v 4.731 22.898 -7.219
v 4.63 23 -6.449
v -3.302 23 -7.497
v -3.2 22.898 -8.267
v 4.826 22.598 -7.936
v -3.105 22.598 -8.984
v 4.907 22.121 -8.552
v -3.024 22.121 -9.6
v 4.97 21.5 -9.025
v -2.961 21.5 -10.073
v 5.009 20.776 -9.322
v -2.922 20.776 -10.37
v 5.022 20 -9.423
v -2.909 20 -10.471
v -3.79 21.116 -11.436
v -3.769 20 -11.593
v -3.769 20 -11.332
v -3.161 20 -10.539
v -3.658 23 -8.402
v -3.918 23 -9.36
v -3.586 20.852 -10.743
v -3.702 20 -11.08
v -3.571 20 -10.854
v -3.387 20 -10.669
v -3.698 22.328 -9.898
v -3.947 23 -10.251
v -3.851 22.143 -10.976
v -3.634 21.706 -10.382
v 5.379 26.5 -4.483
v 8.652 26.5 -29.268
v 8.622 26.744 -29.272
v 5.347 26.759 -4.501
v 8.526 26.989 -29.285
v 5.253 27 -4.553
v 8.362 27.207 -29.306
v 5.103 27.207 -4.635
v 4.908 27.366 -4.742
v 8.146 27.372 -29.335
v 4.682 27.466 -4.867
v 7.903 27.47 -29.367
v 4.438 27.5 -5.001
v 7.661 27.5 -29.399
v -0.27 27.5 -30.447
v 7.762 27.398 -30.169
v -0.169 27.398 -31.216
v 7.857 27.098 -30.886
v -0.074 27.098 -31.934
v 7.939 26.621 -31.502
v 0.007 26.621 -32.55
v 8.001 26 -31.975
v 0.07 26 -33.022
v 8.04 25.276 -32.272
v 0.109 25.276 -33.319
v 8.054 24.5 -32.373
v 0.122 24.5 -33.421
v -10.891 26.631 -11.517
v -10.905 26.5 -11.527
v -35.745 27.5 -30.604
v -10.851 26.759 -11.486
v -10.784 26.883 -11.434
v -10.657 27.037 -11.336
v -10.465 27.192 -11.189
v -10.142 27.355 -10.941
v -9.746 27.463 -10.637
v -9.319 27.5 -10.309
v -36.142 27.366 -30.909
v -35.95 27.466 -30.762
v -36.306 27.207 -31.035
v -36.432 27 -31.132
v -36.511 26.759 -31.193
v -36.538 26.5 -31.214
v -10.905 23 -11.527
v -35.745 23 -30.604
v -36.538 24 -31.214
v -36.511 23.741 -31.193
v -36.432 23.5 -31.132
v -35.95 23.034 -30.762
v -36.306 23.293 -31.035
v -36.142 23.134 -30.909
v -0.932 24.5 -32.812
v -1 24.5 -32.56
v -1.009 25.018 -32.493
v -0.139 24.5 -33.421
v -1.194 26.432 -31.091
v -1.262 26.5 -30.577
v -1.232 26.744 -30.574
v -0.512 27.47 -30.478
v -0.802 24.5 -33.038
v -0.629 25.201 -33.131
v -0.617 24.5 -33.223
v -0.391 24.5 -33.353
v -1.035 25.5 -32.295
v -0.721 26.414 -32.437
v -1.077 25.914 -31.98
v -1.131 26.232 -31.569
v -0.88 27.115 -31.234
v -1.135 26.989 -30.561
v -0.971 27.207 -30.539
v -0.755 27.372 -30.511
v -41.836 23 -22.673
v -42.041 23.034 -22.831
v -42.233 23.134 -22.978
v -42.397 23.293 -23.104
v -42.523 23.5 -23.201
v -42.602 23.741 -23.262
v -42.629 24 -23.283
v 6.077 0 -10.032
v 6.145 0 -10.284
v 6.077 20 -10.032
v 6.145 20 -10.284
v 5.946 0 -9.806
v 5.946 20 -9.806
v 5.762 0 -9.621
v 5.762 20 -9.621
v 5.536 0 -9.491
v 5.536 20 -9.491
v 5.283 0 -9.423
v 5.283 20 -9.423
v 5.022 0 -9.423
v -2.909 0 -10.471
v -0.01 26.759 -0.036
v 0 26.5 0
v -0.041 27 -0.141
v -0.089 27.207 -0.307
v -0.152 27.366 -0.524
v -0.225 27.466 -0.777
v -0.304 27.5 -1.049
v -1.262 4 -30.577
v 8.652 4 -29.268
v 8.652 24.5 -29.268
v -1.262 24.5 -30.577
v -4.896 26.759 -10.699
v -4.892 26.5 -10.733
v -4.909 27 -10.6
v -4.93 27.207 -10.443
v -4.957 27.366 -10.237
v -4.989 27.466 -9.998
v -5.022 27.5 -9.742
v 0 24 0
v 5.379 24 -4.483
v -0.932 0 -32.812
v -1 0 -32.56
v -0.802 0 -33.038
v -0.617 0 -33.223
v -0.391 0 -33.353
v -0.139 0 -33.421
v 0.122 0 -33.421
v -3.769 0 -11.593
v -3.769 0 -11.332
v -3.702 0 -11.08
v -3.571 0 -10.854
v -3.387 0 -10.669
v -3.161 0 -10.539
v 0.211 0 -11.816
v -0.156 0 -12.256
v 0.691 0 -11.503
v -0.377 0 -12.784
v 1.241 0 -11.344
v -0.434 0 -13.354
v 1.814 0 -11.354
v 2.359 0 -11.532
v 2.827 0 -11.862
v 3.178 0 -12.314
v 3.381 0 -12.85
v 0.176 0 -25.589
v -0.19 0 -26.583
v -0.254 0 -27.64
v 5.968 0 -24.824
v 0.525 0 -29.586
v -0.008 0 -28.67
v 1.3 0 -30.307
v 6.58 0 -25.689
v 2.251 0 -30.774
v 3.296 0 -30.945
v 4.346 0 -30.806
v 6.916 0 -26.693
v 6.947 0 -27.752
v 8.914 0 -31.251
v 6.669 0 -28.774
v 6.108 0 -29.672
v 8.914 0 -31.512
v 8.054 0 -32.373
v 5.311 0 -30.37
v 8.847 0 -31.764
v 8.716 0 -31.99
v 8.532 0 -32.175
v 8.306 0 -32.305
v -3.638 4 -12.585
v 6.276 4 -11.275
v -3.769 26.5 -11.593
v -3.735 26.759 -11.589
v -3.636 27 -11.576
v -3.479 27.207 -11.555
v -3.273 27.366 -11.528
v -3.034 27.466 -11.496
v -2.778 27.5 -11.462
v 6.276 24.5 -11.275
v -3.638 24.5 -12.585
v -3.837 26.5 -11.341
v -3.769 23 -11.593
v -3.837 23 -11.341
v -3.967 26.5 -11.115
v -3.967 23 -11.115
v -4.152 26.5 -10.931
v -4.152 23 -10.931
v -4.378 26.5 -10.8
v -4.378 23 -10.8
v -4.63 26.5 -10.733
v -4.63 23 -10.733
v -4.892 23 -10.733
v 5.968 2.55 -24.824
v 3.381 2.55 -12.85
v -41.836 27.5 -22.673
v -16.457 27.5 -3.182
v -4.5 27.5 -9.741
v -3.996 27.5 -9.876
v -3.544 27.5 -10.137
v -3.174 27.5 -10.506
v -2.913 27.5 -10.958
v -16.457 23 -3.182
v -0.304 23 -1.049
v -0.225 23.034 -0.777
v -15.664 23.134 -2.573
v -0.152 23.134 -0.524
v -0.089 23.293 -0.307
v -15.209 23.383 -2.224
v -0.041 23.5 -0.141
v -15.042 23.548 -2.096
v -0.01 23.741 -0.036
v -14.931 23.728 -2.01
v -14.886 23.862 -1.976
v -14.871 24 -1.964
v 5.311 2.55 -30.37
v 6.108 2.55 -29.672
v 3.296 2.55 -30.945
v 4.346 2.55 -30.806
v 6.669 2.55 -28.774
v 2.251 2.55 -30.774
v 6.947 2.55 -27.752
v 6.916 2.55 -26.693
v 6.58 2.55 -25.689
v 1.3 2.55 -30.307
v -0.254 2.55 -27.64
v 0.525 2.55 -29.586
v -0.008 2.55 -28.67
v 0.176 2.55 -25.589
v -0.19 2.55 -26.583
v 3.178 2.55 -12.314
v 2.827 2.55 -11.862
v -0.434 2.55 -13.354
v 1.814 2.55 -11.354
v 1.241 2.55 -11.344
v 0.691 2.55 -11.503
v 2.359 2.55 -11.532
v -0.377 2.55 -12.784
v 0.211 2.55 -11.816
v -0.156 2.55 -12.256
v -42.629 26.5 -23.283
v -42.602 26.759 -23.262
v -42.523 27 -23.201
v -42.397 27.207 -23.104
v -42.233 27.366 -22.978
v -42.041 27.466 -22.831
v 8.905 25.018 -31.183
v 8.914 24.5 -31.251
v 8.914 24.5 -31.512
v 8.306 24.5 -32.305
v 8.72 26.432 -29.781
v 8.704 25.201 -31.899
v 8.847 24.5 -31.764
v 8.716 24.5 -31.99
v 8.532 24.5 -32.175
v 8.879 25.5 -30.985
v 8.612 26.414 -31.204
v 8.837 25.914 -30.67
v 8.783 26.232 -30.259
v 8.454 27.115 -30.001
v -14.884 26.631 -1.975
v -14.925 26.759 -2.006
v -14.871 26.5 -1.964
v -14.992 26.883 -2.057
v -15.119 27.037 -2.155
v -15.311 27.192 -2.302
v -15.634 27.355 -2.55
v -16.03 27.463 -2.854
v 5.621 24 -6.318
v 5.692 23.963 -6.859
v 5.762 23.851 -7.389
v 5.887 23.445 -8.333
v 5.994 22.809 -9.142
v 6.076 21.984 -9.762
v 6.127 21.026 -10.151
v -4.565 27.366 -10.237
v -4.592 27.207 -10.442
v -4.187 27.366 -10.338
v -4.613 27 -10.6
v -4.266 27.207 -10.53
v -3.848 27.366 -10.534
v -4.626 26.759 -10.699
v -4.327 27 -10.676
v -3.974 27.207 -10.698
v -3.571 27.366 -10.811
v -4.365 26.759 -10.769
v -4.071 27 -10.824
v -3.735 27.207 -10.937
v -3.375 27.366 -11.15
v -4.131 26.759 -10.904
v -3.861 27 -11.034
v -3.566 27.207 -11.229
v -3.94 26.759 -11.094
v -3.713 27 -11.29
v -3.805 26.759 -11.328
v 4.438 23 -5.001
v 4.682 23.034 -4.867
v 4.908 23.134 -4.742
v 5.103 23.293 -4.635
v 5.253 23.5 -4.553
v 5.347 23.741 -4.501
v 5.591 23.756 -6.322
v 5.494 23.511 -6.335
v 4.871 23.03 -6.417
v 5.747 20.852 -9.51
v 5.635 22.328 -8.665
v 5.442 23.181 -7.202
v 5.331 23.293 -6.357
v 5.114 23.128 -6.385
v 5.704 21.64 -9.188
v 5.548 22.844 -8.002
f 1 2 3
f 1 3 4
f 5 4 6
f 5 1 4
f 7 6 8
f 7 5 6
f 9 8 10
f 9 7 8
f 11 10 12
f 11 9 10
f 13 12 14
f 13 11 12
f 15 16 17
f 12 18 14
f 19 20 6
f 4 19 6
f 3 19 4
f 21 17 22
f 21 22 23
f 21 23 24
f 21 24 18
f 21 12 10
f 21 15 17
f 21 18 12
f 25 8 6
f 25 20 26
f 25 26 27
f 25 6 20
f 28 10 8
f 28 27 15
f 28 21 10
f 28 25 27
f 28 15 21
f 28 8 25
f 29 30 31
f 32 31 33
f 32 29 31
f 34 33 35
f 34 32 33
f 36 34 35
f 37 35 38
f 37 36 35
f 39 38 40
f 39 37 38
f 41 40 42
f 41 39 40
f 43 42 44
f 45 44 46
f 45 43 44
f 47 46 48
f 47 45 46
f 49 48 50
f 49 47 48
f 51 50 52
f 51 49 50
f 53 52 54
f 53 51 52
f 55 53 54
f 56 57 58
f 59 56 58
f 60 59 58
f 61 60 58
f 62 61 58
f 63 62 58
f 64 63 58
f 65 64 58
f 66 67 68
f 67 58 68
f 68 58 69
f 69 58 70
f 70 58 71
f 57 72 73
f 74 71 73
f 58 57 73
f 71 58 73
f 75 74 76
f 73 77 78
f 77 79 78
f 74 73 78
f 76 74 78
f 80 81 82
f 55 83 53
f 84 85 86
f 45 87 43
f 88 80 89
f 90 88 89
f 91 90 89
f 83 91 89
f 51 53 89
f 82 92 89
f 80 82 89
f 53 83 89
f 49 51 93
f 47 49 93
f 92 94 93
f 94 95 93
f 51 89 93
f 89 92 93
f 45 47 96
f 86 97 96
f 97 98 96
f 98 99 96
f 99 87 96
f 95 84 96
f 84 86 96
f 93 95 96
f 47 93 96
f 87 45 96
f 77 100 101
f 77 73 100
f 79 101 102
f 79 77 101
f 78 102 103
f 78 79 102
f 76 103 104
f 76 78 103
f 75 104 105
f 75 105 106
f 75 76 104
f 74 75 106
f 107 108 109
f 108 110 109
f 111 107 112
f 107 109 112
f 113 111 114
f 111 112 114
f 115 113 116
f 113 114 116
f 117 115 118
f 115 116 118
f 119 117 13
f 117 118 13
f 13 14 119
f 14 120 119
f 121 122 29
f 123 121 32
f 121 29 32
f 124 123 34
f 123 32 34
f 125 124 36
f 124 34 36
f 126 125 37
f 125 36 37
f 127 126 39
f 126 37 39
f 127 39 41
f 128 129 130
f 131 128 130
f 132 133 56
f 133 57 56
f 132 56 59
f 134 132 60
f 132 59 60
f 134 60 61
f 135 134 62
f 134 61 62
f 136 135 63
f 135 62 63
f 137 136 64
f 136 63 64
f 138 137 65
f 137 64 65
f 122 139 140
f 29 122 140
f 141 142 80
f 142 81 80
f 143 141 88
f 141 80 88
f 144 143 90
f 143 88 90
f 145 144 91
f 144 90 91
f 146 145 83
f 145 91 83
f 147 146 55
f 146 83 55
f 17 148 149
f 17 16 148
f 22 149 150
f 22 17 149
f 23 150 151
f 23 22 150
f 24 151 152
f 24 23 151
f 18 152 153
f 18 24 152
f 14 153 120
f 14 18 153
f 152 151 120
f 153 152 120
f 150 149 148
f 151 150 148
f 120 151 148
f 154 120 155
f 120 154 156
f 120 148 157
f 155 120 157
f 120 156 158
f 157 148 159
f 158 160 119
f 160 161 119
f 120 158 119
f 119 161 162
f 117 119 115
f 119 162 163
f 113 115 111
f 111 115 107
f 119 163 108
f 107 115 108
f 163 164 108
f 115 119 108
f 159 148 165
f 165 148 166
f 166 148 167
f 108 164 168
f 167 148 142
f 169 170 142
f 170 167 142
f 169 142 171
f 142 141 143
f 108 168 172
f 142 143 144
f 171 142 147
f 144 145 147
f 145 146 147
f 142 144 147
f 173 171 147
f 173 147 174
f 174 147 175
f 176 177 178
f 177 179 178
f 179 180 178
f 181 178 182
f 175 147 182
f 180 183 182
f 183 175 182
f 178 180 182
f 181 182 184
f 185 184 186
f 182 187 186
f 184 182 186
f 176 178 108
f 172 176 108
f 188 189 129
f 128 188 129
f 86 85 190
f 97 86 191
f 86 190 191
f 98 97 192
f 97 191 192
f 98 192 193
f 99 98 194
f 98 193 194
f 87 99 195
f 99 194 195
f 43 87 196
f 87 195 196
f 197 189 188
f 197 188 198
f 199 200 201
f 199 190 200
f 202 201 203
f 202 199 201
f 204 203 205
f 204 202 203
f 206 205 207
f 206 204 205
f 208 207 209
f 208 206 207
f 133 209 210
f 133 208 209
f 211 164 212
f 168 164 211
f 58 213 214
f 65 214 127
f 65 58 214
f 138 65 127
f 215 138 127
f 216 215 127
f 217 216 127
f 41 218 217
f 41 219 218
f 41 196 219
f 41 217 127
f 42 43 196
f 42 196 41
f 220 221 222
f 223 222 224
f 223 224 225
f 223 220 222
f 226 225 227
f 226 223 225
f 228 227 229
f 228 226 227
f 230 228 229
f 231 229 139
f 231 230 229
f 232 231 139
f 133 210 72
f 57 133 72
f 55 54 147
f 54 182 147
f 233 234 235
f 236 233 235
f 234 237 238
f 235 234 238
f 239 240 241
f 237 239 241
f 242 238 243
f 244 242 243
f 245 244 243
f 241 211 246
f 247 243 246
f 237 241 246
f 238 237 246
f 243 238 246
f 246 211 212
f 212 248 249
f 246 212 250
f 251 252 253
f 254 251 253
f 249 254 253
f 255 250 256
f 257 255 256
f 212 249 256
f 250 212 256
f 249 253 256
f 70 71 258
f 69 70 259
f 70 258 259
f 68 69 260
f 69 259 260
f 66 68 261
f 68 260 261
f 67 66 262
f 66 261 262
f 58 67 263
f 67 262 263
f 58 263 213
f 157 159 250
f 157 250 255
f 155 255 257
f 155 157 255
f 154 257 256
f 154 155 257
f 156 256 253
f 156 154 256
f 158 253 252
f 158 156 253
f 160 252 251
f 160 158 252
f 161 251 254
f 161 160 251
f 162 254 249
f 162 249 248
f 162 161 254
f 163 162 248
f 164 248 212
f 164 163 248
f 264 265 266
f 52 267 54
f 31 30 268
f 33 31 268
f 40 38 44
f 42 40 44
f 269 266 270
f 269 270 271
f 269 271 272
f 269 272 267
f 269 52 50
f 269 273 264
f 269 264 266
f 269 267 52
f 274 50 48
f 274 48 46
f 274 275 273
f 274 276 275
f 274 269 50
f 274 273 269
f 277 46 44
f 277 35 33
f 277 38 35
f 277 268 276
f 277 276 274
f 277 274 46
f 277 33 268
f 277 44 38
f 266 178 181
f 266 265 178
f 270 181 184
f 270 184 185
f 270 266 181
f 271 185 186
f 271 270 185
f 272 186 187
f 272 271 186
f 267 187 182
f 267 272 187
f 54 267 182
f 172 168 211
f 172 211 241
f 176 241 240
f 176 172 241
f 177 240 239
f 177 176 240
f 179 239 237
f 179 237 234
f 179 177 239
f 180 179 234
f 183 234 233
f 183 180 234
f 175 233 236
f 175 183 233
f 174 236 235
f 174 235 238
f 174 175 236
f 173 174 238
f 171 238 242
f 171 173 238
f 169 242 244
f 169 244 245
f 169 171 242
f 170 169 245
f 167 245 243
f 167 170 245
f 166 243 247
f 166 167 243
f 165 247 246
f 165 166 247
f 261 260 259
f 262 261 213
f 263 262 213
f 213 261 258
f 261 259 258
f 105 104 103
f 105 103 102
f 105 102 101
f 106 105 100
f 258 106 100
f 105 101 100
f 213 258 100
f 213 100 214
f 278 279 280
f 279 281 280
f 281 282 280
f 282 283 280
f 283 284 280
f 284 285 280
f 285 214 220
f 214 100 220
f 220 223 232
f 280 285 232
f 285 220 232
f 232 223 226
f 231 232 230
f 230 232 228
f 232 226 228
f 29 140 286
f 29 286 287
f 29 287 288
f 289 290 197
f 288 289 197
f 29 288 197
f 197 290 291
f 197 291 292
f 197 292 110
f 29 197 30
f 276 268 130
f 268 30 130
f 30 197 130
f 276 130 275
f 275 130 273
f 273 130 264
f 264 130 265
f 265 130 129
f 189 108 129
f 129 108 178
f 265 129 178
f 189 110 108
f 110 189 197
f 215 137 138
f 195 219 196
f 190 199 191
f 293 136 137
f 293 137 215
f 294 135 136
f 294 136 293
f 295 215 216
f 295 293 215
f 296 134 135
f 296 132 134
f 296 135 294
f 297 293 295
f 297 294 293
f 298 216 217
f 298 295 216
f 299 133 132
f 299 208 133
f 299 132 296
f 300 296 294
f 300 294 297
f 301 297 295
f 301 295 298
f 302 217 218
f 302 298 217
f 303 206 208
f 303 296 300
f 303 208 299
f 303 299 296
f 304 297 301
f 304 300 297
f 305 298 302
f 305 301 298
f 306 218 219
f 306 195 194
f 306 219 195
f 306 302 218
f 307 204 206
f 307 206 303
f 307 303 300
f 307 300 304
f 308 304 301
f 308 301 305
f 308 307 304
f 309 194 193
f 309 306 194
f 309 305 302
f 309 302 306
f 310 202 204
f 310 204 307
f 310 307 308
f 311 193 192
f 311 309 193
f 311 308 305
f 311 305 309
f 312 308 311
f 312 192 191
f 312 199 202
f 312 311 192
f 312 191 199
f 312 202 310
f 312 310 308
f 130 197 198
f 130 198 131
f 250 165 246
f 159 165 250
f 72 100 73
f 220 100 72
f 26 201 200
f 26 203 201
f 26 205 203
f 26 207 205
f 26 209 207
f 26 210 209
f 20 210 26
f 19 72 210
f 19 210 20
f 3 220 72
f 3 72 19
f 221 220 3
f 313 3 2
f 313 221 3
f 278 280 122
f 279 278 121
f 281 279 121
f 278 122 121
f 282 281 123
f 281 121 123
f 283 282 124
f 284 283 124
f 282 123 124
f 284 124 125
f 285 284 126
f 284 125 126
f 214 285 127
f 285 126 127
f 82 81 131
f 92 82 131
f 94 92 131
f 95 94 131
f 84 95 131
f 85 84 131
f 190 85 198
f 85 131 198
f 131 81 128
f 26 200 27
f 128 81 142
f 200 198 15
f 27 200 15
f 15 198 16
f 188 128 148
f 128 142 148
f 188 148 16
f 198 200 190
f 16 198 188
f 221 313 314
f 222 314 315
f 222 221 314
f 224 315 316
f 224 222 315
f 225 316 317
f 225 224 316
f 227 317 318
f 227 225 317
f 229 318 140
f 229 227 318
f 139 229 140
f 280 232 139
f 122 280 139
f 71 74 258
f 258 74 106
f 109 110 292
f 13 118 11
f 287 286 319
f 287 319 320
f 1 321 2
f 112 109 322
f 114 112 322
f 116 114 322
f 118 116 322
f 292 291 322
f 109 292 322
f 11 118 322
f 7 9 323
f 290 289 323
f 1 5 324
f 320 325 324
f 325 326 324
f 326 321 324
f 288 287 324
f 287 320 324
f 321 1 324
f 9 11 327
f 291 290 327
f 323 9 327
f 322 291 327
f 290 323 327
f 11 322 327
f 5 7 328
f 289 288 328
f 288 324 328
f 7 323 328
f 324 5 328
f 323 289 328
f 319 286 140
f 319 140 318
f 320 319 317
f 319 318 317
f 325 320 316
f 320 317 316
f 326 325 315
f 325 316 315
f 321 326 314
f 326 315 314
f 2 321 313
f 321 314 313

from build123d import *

# Parameters (mm, degrees)
EXTRUDE_THIN1_DEPTH = 27.5
CUT_EXTRUDE1_DEPTH  = 23
CUT_EXTRUDE2_DEPTH  = 2.55
FILLET1_R           = 3
FILLET2_R           = 1
CUT_EXTRUDE3_REACH  = 66.468
SKETCH5_W           = 18.148983488
SKETCH5_H           = 20.5


# Read off the part's stored shape, not the designer's step: Extrude-Thin1
with BuildPart() as part:
    # Extrude-Thin1 outline → Extrude-Thin1 (new body)
    with BuildSketch(Plane(origin=(0, 0, 0), x_dir=(1, 0, 0), z_dir=(0, 1, 0))):
        Polygon((-10.904976106, 11.527203276), (-36.538248885, 31.213507371), (-42.629212569, 23.282545173), (-14.870844874, 1.964172277), (0, 0), (5.378547824, 4.483293206), (9.045002742, 32.242203638), (-0.868893841, 33.551651823), (-3.900133282, 10.601988993), align=None)
    extrude(amount=EXTRUDE_THIN1_DEPTH)

    # Sketch2 → Cut-Extrude1 (cut)
    with BuildSketch(Plane.XZ):
        Polygon((-3.900133282, -10.601988993), (6.0137633, -9.292540808), (4.704315116, 0.621355774), (-14.870844874, -1.964172277), (-42.629212569, -23.282545173), (-36.538248885, -31.213507371), (-10.904976106, -11.527203276), align=None)
    extrude(amount=-CUT_EXTRUDE1_DEPTH, mode=Mode.SUBTRACT)

    # Sketch3 → Cut-Extrude2 (cut)
    with BuildSketch(Plane.XZ):
        with BuildLine():
            Line((3.380947821, -12.850204555), (5.968175927, -24.824313447))
            ThreePointArc((5.968175927, -24.824313447), (3.826164813, -30.914148414), (0.176477543, -25.589293076))
            Line((0.176477543, -25.589293076), (-0.433912303, -13.354079255))
            ThreePointArc((-0.433912303, -13.354079255), (1.241314096, -11.34411656), (3.380947821, -12.850204555))
        make_face()
    extrude(amount=-CUT_EXTRUDE2_DEPTH, mode=Mode.SUBTRACT)

    # Fillet1
    fillet1_edges = [part.edges().sort_by_distance(p)[0] for p in [
        (4.08805445, 27.5, -32.89692773),
        (1.056815009, 23, -9.947264901),
    ]]
    fillet(fillet1_edges, radius=FILLET1_R)

    # Fillet2
    fillet2_edges = [part.edges().sort_by_distance(p)[0] for p in [
        (-3.900133282, 25.25, -10.601988993),
        (-7.435422437, 27.5, -0.982086139),
        (2.689273912, 27.5, -2.241646603),
        (-3.900133282, 10, -10.601988993),
        (-39.583730727, 23, -27.248026272),
        (-7.435422437, 23, -0.982086139),
        (-7.402554694, 27.5, -11.064596135),
        (2.689273912, 23, -2.241646603),
        (-0.868893841, 12.25, -33.551651823),
        (9.045002742, 12.25, -32.242203638),
        (6.0137633, 10, -9.292540808),
        (7.015358055, 27.5, -16.875663935),
        (5.499738334, 23, -5.40083252),
        (8.929944194, 26.621320344, -31.371089714),
        (-2.580930789, 27.5, -20.589735921),
        (-0.983952389, 26.621320344, -32.680537899),
        (5.898704753, 22.121320344, -8.421426884),
        (-4.01519183, 22.121320344, -9.730875069),
        (-39.583730727, 27.5, -27.248026272),
    ]]
    fillet(fillet2_edges, radius=FILLET2_R)

    # Sketch5 → Cut-Extrude3 (cut, up to next)
    with BuildSketch(Plane(origin=(4.704315116, 0, 0.621355774), x_dir=(0.13094481849155867, 0, -0.9913896582626898), z_dir=(0.9913896582626898, 0, 0.13094481849155867)), mode=Mode.PRIVATE) as cut_extrude3_sk1:
        with Locations((21.074491744, 14.25)):
            Rectangle(SKETCH5_W, SKETCH5_H)
    cut_extrude3_tool1 = extrude(cut_extrude3_sk1.sketch, amount=-CUT_EXTRUDE3_REACH, mode=Mode.PRIVATE) & part.part
    add(cut_extrude3_tool1.solids().sort_by_distance((7.463911, 14.25, -20.271677))[0], mode=Mode.SUBTRACT)


solid = part.part
